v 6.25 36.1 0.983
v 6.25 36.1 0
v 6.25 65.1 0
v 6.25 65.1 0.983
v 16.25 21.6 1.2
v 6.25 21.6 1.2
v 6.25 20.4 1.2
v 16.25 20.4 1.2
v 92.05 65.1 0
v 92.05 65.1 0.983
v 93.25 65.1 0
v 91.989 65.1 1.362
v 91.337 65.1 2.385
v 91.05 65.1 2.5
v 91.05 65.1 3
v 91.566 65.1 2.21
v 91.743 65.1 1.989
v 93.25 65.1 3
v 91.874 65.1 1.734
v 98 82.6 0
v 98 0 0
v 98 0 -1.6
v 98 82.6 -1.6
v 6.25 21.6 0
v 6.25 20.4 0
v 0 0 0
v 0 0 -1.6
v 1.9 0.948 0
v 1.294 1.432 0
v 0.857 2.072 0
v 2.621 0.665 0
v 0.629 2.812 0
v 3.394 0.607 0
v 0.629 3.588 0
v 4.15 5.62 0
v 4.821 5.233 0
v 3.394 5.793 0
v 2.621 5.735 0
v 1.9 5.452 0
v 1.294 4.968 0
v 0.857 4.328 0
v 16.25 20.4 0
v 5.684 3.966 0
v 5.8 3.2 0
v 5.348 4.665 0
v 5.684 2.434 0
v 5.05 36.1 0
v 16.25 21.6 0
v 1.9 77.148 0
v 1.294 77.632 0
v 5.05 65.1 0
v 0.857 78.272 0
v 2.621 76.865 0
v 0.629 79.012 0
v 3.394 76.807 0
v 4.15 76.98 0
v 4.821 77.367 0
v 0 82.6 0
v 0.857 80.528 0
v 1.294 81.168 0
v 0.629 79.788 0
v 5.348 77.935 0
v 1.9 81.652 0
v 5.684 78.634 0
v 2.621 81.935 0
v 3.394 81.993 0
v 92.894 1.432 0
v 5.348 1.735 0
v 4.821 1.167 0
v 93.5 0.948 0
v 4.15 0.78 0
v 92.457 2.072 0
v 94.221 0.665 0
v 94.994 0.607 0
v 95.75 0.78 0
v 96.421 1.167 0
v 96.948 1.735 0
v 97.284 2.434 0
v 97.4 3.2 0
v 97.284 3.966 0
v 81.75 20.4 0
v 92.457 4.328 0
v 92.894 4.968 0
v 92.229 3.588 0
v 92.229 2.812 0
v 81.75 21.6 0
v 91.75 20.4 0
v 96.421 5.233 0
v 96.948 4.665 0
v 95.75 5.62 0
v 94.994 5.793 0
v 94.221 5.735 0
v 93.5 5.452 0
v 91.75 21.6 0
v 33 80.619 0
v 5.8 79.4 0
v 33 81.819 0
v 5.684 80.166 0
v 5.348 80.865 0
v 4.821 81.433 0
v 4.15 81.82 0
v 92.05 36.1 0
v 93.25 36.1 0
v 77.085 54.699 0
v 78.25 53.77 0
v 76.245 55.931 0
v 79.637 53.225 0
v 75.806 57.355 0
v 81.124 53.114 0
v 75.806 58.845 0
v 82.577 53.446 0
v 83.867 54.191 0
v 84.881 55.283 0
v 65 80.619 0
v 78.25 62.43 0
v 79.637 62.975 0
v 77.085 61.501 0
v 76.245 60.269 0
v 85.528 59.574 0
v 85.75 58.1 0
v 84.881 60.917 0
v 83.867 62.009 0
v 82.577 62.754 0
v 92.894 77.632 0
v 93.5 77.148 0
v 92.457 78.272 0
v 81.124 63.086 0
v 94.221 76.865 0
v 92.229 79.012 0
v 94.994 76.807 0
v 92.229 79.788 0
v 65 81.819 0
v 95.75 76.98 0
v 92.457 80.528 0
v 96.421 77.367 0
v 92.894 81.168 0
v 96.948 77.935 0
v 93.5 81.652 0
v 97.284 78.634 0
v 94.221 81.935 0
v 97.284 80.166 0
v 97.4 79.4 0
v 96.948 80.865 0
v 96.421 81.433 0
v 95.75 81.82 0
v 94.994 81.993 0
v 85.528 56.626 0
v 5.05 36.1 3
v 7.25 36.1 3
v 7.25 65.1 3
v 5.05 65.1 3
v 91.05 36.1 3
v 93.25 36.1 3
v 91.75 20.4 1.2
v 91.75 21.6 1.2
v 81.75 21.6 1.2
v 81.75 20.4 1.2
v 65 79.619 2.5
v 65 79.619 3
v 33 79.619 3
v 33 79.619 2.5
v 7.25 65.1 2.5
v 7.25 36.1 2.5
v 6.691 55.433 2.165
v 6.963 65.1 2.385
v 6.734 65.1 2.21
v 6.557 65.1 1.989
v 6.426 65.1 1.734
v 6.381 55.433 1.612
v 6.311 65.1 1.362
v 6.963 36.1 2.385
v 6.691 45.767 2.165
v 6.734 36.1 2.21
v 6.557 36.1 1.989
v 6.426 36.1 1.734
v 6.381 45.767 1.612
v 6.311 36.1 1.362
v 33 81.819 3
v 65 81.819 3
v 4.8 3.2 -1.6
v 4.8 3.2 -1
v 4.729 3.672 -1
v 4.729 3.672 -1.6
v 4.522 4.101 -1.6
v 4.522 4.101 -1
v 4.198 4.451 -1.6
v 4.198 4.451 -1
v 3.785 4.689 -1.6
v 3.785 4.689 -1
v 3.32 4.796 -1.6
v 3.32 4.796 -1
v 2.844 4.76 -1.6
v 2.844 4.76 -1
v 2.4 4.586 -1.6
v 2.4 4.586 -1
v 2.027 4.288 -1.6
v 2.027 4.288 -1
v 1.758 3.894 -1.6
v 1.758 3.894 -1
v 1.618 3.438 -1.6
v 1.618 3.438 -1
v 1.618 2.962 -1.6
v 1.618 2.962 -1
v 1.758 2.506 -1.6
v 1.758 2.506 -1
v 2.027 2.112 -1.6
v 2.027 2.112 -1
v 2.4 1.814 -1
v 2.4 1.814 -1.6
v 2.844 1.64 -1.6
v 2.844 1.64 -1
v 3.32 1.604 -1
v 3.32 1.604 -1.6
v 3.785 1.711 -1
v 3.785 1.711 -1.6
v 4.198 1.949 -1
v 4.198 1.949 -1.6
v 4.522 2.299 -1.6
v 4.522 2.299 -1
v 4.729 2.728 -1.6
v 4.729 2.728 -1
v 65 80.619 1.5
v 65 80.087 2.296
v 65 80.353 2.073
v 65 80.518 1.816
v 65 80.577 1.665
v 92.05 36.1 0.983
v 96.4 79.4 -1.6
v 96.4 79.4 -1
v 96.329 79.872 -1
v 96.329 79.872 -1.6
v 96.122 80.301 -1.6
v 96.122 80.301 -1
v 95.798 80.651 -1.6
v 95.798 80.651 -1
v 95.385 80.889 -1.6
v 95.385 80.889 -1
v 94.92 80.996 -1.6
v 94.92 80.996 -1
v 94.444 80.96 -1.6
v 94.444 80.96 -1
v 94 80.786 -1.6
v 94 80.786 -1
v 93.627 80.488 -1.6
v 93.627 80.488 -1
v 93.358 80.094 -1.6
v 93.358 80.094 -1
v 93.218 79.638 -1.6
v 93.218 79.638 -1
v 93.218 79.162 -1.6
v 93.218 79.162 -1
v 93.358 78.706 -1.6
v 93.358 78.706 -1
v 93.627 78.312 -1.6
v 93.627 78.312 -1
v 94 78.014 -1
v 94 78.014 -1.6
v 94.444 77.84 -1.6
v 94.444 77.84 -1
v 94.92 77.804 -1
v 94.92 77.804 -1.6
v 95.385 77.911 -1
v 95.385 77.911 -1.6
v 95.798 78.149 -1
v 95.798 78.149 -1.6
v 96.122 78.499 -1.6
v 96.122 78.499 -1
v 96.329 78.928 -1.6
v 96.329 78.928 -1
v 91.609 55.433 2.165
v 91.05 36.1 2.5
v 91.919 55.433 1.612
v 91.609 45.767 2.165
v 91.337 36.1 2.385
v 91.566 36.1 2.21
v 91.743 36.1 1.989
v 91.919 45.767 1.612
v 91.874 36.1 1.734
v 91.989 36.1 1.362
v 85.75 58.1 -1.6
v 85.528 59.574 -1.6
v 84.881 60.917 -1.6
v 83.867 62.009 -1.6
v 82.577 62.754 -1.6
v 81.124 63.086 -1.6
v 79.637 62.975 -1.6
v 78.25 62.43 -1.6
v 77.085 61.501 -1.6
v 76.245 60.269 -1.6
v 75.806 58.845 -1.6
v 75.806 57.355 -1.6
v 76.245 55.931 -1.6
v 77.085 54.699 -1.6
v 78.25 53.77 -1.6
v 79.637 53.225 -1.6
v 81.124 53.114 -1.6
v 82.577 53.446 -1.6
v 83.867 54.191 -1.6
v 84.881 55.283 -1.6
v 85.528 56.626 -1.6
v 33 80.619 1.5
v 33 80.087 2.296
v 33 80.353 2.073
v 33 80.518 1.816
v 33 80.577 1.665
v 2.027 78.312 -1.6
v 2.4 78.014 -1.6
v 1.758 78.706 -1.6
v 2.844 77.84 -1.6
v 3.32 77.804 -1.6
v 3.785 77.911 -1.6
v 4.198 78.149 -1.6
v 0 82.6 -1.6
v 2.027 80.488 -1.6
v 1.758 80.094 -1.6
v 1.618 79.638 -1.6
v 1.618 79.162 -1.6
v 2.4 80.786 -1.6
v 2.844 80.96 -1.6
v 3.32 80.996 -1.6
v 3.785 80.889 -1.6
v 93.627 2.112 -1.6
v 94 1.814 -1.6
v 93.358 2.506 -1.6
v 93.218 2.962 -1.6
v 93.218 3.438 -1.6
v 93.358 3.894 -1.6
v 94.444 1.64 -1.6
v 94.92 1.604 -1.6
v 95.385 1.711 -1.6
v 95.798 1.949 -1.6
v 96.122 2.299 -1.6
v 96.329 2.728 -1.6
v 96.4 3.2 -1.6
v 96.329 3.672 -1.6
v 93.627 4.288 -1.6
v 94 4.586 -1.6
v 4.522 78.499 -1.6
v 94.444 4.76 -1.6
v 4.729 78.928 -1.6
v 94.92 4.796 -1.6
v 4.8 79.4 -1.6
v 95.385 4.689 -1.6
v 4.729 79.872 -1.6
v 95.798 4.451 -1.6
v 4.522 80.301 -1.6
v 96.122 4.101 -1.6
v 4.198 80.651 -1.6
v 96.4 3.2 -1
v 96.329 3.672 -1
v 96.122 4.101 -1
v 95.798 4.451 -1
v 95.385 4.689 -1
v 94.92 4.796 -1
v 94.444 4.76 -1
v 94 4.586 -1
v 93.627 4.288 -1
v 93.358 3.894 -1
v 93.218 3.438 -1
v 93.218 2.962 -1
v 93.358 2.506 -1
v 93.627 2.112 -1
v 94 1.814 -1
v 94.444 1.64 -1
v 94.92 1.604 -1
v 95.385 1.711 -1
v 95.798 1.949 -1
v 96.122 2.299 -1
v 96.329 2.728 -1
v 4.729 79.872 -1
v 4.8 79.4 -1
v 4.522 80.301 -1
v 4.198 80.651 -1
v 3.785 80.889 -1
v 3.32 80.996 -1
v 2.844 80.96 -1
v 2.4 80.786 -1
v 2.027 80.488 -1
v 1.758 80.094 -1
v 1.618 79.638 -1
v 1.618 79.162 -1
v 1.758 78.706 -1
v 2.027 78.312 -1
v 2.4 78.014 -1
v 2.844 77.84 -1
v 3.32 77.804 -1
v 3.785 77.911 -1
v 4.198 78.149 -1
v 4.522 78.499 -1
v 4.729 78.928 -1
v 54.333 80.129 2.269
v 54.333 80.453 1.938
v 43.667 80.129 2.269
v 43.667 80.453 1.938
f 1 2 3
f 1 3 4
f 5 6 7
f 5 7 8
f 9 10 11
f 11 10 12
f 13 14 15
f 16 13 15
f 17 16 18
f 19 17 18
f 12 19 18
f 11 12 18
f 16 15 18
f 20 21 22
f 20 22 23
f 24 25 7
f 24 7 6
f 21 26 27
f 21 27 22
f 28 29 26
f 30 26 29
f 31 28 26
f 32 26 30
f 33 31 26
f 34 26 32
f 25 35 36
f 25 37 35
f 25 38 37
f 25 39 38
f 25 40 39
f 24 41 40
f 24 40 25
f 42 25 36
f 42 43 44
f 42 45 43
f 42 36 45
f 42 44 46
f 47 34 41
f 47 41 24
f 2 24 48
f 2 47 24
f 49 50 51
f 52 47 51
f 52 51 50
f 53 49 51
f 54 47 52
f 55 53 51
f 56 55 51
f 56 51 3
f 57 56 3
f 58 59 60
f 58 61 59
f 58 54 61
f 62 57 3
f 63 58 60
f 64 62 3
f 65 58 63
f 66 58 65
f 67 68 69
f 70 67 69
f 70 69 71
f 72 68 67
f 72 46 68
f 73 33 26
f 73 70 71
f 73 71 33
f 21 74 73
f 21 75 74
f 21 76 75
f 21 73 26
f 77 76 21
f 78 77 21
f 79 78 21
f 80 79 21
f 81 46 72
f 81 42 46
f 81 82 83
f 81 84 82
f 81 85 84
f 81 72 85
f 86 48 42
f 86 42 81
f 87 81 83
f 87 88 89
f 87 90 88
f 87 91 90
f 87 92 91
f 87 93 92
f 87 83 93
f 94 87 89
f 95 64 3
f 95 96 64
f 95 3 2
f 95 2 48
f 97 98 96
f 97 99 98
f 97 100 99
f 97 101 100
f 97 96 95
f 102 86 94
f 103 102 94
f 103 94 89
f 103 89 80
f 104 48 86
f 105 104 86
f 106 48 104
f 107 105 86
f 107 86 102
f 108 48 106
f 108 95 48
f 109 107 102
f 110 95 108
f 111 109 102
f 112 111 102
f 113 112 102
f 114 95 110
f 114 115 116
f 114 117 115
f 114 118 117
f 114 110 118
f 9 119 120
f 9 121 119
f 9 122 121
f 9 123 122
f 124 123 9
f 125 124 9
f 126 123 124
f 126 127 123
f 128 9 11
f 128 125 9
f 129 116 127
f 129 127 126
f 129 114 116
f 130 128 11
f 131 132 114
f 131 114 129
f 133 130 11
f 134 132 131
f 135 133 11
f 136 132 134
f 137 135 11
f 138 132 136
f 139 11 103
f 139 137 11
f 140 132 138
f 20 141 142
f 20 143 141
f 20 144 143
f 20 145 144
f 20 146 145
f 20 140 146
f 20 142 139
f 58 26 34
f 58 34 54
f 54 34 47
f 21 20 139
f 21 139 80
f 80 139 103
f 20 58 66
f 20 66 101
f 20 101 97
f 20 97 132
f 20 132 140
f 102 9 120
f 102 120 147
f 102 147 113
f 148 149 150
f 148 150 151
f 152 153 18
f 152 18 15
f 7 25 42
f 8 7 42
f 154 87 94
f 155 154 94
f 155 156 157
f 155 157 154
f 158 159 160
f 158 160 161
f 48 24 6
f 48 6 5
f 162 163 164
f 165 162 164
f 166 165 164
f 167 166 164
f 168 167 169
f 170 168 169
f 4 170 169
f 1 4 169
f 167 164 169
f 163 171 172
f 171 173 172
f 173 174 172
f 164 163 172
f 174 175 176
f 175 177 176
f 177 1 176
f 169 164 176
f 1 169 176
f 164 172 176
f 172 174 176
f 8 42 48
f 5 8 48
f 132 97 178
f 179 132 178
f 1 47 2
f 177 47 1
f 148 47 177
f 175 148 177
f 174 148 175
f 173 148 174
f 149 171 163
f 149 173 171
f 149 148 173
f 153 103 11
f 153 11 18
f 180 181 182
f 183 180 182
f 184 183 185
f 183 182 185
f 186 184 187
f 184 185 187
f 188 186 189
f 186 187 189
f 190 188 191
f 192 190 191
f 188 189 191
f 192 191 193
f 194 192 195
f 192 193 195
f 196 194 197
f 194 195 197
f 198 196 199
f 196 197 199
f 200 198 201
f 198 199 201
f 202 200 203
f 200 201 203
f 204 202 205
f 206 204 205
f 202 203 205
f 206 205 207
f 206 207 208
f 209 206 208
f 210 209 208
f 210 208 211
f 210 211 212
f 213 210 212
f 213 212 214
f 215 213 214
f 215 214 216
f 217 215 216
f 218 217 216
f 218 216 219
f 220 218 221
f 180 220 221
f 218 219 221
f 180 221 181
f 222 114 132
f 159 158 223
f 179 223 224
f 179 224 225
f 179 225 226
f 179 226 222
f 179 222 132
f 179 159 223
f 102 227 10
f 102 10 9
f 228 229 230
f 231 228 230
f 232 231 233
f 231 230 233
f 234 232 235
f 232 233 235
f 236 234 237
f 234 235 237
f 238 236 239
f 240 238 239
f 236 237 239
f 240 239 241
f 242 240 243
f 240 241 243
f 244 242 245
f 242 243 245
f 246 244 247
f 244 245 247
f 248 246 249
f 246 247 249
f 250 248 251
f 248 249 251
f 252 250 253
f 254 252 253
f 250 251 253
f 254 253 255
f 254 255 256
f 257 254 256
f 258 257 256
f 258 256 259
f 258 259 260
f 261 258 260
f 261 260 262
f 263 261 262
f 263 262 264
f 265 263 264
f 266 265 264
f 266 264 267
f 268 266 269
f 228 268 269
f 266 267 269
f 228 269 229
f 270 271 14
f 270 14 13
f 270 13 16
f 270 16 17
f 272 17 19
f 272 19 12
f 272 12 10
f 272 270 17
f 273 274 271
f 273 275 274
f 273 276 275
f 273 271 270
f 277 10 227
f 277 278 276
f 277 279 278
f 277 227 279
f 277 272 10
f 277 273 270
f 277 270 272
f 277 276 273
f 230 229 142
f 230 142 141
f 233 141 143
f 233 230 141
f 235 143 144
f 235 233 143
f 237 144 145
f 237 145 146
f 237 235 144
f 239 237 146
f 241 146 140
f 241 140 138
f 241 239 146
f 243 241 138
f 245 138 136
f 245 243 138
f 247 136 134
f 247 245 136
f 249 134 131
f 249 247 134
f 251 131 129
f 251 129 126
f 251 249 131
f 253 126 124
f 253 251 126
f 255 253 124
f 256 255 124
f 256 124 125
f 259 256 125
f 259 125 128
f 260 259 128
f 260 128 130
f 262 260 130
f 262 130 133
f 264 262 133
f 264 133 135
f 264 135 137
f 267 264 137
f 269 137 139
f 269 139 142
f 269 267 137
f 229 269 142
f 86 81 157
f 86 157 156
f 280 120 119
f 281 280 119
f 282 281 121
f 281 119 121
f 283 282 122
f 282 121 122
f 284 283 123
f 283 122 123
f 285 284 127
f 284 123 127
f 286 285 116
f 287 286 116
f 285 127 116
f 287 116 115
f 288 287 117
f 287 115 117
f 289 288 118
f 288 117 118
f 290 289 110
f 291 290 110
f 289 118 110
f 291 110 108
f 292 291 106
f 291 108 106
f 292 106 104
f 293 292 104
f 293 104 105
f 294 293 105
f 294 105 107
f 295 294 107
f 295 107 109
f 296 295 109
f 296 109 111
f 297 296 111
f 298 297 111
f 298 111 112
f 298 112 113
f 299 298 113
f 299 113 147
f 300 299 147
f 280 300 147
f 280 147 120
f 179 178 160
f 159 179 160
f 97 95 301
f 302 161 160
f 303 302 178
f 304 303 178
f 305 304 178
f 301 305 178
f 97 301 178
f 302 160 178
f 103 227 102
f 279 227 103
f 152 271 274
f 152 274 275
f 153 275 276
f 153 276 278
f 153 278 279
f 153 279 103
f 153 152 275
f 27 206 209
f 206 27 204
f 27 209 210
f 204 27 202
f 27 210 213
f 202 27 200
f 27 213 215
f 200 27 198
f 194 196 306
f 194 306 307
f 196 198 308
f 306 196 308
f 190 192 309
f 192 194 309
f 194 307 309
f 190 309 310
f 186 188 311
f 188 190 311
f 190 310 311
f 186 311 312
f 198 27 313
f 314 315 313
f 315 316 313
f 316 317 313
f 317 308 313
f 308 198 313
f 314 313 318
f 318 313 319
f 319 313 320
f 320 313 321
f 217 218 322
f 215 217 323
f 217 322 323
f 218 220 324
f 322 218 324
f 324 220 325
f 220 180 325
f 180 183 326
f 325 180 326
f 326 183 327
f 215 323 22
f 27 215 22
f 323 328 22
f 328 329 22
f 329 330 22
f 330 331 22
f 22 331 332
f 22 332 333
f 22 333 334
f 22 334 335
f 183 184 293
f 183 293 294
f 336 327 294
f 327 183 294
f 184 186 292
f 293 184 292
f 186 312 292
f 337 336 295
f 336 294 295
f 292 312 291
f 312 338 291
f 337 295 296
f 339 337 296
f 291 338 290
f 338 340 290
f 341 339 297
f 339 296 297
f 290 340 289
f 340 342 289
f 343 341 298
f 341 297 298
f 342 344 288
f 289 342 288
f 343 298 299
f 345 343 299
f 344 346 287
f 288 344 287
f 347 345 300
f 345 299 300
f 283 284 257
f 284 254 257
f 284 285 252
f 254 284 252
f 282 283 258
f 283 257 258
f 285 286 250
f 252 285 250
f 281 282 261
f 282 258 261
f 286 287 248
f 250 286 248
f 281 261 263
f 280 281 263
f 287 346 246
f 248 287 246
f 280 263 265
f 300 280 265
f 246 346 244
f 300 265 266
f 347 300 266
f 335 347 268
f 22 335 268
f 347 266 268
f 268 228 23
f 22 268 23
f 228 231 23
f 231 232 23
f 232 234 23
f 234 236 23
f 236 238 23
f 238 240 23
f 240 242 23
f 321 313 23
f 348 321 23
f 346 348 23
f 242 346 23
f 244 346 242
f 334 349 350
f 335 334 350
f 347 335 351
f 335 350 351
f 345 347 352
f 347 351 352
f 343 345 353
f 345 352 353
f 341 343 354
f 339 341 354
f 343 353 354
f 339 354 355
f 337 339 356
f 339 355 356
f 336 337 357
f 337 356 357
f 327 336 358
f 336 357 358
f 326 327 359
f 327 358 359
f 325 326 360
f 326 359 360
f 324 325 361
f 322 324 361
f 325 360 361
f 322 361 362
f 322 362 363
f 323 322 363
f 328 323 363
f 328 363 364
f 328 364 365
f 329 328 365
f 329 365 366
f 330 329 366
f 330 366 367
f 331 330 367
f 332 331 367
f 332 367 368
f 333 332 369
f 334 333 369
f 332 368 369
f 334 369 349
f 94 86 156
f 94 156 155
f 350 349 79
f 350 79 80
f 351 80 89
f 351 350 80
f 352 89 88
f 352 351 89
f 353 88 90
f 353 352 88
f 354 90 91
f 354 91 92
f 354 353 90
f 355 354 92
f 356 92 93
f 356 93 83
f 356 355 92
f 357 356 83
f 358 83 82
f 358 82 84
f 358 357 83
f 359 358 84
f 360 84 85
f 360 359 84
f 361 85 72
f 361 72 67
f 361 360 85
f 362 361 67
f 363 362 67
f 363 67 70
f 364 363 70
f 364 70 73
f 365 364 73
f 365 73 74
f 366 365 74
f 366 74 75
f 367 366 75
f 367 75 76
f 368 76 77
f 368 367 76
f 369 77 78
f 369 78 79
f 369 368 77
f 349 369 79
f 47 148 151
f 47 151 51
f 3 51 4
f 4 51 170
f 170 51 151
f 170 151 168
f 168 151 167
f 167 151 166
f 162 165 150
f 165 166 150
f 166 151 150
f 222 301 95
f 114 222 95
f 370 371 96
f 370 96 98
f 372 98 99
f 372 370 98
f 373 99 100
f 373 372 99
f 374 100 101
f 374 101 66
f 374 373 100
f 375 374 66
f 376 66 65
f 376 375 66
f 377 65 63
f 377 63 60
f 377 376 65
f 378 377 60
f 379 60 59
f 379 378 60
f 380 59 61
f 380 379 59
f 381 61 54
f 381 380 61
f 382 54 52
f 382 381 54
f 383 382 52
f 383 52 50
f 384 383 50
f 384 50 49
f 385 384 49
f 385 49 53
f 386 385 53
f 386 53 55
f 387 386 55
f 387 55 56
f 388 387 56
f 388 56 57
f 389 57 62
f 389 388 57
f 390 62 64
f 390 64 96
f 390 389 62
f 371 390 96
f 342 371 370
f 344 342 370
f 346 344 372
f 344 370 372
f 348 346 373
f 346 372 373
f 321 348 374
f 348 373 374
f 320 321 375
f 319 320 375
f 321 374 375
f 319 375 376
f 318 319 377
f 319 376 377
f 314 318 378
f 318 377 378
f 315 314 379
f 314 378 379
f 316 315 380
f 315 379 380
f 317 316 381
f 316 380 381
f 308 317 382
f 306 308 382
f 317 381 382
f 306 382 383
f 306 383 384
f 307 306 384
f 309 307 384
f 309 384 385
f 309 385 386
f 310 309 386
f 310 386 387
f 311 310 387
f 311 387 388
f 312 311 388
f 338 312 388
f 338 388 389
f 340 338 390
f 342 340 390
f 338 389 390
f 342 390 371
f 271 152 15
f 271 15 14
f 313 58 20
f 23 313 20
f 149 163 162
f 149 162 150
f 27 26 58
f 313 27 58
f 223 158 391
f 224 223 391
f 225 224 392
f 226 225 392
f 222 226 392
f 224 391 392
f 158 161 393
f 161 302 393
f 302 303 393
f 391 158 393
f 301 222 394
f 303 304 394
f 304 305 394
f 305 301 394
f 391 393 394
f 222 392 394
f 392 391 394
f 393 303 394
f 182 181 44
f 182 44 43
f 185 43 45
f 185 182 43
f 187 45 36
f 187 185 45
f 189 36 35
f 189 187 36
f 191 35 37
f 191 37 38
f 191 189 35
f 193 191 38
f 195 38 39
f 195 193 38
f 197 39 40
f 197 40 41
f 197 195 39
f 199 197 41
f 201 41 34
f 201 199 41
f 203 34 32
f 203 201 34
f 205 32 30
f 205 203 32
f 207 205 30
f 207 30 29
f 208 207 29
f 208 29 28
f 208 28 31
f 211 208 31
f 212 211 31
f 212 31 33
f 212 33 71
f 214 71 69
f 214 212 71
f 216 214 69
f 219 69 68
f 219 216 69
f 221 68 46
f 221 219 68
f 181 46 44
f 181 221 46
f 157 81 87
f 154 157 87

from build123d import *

# Parameters (mm, degrees)
F0_W     = 98
F0_H     = 82.6
F0_R     = 1.6
F2_DEPTH = 1.6
F1_R     = 5
F3_DEPTH = 1.601
F5_START = -36.1
F5_DEPTH = 29
F7_START = 33
F7_DEPTH = 32
F1_W     = 10
F1_H     = 1.2
F8_DEPTH = 1.2
F9_SIZE  = 1


with BuildPart() as f2:
    # F0 (on Top) → F2 (new body)
    with BuildSketch(Plane.XY):
        with Locations((49, 41.3)):
            Rectangle(F0_W, F0_H)
        with Locations((3.2, 3.2)):
            Circle(F0_R, mode=Mode.SUBTRACT)
        with Locations((94.8, 3.2)):
            Circle(F0_R, mode=Mode.SUBTRACT)
        with Locations((3.2, 79.4)):
            Circle(F0_R, mode=Mode.SUBTRACT)
        with Locations((94.8, 79.4)):
            Circle(F0_R, mode=Mode.SUBTRACT)
    extrude(amount=-F2_DEPTH)

    # F1 (on face) → F3 (cut, through all)
    with BuildSketch(Plane.XY):
        with Locations((80.75, 58.1)):
            Circle(F1_R)
    extrude(amount=-F3_DEPTH, mode=Mode.SUBTRACT)

    # F4 (on Front) → F5 (join)
    with BuildSketch(Plane.XZ.offset(F5_START)):
        with BuildLine():
            add(Edge.make_bspline(
                [(6.25, 0.9831411553), (6.1998556443, 0.4976120788), (6.25, 0.0696883488), (6.25, 0)],
                knots=[1.5113210061, 1.5113210061, 1.5113210061, 1.5113210061, 2.6925824036, 2.6925824036, 2.6925824036, 2.6925824036], degree=3))
            Line((6.25, 0), (6.25, 0.9831411553))
        make_face()
        with BuildLine():
            Line((5.05, 0), (6.25, 0))
            add(Edge.make_bspline(
                [(6.25, 0.9831411553), (6.1998556443, 0.4976120788), (6.25, 0.0696883488), (6.25, 0)],
                knots=[1.5113210061, 1.5113210061, 1.5113210061, 1.5113210061, 2.6925824036, 2.6925824036, 2.6925824036, 2.6925824036], degree=3))
            Line((6.25, 0.9831411553), (6.25, 3))
            Line((6.25, 3), (5.05, 3))
            Line((5.05, 3), (5.05, 0))
        make_face()
        with BuildLine():
            Line((6.25, 3), (6.25, 0.9831411553))
            add(Edge.make_bspline(
                [(7.25, 2.5), (6.5424729796, 2.3198194624), (6.3141553328, 1.6043332928), (6.25, 0.9831411553)],
                knots=[0, 0, 0, 0, 1.5113210061, 1.5113210061, 1.5113210061, 1.5113210061], degree=3))
            Line((7.25, 2.5), (7.25, 3))
            Line((7.25, 3), (6.25, 3))
        make_face()
        with BuildLine():
            Line((92.05, 0.9831411553), (92.05, 3))
            Line((92.05, 3), (91.05, 3))
            Line((91.05, 3), (91.05, 2.5))
            add(Edge.make_bspline(
                [(91.05, 2.5), (91.7575270204, 2.3198194624), (91.9858446672, 1.6043332928), (92.05, 0.9831411553)],
                knots=[0, 0, 0, 0, 1.5113210061, 1.5113210061, 1.5113210061, 1.5113210061], degree=3))
        make_face()
        with BuildLine():
            Line((93.25, 3), (92.05, 3))
            Line((92.05, 3), (92.05, 0.9831411553))
            add(Edge.make_bspline(
                [(92.05, 0.9831411553), (92.1001443557, 0.4976120788), (92.05, 0.0696883488), (92.05, 0)],
                knots=[1.5113210061, 1.5113210061, 1.5113210061, 1.5113210061, 2.6925824036, 2.6925824036, 2.6925824036, 2.6925824036], degree=3))
            Line((92.05, 0), (93.25, 0))
            Line((93.25, 0), (93.25, 3))
        make_face()
        with BuildLine():
            add(Edge.make_bspline(
                [(92.05, 0.9831411553), (92.1001443557, 0.4976120788), (92.05, 0.0696883488), (92.05, 0)],
                knots=[1.5113210061, 1.5113210061, 1.5113210061, 1.5113210061, 2.6925824036, 2.6925824036, 2.6925824036, 2.6925824036], degree=3))
            Line((92.05, 0.9831411553), (92.05, 0))
        make_face()
    extrude(amount=-F5_DEPTH)

    # F6 (on Right) → F7 (join)
    with BuildSketch(Plane.YZ.offset(F7_START)):
        with BuildLine():
            add(Edge.make_bspline(
                [(80.6190222502, 1.5), (80.7199138112, 0.9911874772), (80.6190222502, 0.2993458475), (80.6190222502, 0)],
                knots=[0.4926390921, 0.4926390921, 0.4926390921, 0.4926390921, 1, 1, 1, 1], degree=3))
            Line((80.6190222502, 0), (81.8190222502, 0))
            Line((81.8190222502, 0), (81.8190222502, 3))
            Line((81.8190222502, 3), (80.6190222502, 3))
            Line((80.6190222502, 3), (80.6190222502, 1.5))
        make_face()
        with BuildLine():
            Line((80.6190222502, 1.5), (80.6190222502, 0))
            add(Edge.make_bspline(
                [(80.6190222502, 1.5), (80.7199138112, 0.9911874772), (80.6190222502, 0.2993458475), (80.6190222502, 0)],
                knots=[0.4926390921, 0.4926390921, 0.4926390921, 0.4926390921, 1, 1, 1, 1], degree=3))
        make_face()
        with BuildLine():
            add(Edge.make_bspline(
                [(79.6190222502, 2.5), (80.2328512073, 2.3155356757), (80.5210582047, 1.9940485863), (80.6190222502, 1.5)],
                knots=[0, 0, 0, 0, 0.4926390921, 0.4926390921, 0.4926390921, 0.4926390921], degree=3))
            Line((80.6190222502, 1.5), (80.6190222502, 3))
            Line((80.6190222502, 3), (79.6190222502, 3))
            Line((79.6190222502, 3), (79.6190222502, 2.5))
        make_face()
    extrude(amount=F7_DEPTH)

    # F1 (on face) → F8 (join)
    with BuildSketch(Plane.XY):
        with Locations((11.25, 21)):
            Rectangle(F1_W, F1_H)
        with Locations((86.75, 21)):
            Rectangle(F1_W, F1_H)
    extrude(amount=F8_DEPTH)

    # F9
    f9_edges = [f2.edges().sort_by_distance(p)[0] for p in [
        (1.6, 79.4, 0),
        (1.6, 3.2, 0),
        (93.2, 3.2, 0),
        (93.2, 79.4, 0),
    ]]
    chamfer(f9_edges, length=F9_SIZE)


solid = f2.part
